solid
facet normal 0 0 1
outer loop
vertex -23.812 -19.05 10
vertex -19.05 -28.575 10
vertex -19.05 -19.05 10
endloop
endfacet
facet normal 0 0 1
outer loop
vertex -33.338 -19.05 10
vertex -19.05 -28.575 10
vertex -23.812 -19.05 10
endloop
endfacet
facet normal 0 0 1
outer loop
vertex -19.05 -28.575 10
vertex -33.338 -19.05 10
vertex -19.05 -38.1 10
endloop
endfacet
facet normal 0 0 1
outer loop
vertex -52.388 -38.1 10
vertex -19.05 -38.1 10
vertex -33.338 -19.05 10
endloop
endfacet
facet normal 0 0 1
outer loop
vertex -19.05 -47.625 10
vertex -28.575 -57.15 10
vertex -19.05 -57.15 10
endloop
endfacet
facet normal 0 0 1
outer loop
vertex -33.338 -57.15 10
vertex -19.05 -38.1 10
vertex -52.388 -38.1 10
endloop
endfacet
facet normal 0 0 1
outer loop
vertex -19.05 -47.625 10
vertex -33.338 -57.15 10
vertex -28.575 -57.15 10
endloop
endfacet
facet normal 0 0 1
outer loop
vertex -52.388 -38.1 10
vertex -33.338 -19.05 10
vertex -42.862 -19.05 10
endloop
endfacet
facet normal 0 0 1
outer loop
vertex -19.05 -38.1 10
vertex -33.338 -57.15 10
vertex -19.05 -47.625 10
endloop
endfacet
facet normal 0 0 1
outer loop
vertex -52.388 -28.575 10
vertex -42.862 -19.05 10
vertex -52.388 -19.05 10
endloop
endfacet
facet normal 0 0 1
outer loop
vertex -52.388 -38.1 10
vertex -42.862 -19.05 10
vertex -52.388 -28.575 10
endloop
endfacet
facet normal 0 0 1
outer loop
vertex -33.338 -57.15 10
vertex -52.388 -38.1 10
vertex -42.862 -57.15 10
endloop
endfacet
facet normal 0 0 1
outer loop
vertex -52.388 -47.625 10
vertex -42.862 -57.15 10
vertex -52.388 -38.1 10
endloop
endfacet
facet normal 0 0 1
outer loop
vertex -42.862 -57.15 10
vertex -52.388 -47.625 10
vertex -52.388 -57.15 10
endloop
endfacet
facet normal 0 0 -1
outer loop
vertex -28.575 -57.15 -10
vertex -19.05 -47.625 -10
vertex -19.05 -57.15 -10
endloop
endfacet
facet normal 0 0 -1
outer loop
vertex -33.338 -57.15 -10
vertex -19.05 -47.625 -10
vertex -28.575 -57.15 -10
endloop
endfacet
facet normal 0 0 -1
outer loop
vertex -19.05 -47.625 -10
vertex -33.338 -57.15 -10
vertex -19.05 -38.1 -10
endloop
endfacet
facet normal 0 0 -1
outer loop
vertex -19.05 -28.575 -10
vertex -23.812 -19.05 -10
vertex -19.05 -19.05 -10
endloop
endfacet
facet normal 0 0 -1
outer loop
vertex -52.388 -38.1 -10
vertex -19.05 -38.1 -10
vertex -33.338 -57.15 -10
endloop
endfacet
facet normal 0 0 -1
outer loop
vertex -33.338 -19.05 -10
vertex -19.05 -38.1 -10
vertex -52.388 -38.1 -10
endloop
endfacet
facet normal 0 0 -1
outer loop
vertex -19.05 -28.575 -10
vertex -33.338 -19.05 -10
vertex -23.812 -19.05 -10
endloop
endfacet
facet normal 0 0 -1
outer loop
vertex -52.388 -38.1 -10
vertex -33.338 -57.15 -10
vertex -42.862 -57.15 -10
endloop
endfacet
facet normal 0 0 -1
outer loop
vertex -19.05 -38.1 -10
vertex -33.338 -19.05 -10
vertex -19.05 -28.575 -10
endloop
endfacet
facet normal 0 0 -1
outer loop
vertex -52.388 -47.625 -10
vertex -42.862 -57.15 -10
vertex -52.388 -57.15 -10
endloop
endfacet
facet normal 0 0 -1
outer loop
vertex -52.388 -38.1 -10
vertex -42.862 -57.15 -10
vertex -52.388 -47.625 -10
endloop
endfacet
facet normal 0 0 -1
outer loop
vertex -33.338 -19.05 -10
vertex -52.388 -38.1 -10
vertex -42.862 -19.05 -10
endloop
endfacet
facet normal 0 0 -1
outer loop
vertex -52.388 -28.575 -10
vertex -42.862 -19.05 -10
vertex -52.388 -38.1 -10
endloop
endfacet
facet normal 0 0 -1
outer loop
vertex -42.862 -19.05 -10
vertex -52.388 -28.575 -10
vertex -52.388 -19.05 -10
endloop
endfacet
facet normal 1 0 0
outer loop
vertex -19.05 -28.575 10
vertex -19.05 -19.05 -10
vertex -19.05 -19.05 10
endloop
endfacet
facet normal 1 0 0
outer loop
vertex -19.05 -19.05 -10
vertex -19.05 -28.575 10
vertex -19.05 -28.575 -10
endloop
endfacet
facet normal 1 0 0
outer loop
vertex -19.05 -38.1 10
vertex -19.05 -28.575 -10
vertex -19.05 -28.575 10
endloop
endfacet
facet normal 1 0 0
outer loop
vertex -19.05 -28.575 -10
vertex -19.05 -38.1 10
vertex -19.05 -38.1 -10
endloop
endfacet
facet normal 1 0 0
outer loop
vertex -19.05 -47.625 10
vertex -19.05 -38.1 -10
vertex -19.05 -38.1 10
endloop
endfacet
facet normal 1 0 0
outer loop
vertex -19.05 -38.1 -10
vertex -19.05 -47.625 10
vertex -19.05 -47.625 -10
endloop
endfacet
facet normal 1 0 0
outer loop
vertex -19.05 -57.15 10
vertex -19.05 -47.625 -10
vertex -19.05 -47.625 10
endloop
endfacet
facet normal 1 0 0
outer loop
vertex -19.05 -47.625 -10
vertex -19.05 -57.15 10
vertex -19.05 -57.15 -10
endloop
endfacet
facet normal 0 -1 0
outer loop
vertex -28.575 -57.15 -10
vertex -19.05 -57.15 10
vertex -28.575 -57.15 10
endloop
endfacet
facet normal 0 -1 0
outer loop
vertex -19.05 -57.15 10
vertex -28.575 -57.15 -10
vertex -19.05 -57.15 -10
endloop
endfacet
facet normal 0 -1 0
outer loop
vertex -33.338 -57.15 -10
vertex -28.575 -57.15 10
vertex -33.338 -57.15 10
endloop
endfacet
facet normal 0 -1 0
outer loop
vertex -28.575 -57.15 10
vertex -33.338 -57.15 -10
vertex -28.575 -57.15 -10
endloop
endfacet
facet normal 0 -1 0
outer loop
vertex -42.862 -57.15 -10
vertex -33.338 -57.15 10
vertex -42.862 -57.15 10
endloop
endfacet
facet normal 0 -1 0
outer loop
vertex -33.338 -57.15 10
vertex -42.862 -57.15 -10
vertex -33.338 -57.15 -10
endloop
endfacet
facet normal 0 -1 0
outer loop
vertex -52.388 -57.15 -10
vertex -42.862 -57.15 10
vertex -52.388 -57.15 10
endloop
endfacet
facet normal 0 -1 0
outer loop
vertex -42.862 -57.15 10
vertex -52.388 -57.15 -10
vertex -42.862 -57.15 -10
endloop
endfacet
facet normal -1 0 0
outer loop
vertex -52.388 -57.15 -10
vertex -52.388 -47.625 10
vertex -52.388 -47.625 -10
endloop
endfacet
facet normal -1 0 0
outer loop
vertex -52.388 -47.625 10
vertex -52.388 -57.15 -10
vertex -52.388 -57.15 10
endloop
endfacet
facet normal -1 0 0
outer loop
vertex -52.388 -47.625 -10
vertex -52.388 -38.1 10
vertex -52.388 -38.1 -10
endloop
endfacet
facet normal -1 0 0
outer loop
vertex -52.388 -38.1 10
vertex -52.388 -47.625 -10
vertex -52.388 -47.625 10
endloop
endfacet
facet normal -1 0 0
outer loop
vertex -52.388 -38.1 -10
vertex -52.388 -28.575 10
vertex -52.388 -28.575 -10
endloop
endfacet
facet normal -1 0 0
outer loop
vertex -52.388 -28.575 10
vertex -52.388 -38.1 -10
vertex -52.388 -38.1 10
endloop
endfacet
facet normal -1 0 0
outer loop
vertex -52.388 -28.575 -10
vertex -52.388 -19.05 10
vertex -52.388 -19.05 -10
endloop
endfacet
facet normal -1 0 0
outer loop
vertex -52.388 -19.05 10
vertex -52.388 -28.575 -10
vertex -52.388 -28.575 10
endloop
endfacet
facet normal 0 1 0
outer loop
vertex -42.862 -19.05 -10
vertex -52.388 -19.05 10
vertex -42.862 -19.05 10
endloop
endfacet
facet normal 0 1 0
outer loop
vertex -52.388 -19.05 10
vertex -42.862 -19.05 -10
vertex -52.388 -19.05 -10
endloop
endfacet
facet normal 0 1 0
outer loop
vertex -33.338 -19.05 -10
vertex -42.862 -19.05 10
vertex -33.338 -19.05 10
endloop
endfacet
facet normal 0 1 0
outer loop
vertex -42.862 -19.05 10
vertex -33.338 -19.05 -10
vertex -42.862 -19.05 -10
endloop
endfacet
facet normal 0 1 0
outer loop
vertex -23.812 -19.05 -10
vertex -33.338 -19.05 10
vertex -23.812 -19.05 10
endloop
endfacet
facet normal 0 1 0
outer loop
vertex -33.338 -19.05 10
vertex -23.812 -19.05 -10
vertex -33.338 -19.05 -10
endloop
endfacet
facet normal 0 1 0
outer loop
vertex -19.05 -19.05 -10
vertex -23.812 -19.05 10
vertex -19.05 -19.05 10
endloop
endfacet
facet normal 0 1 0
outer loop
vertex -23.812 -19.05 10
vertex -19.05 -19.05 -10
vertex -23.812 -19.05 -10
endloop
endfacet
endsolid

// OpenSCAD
polyhedron(
    points=[
    [-19.05, -19.05, 10],
    [-19.05, -28.575, 10],
    [-19.05, -38.1, 10],
    [-19.05, -47.625, 10],
    [-19.05, -57.15, 10],
    [-28.575, -57.15, 10],
    [-33.3375, -57.15, 10],
    [-42.8625, -57.15, 10],
    [-52.3875, -57.15, 10],
    [-52.3875, -47.625, 10],
    [-52.3875, -38.1, 10],
    [-52.3875, -28.575, 10],
    [-52.3875, -19.05, 10],
    [-42.8625, -19.05, 10],
    [-33.3375, -19.05, 10],
    [-23.8125, -19.05, 10],
    [-19.05, -19.05, -10],
    [-19.05, -28.575, -10],
    [-19.05, -38.1, -10],
    [-19.05, -47.625, -10],
    [-19.05, -57.15, -10],
    [-28.575, -57.15, -10],
    [-33.3375, -57.15, -10],
    [-42.8625, -57.15, -10],
    [-52.3875, -57.15, -10],
    [-52.3875, -47.625, -10],
    [-52.3875, -38.1, -10],
    [-52.3875, -28.575, -10],
    [-52.3875, -19.05, -10],
    [-42.8625, -19.05, -10],
    [-33.3375, -19.05, -10],
    [-23.8125, -19.05, -10],
    ],
    faces=[
        [0,1,2,3,4,5,6,7,8,9,10,11,12,13,14,15],
        [31,30,29,28,27,26,25,24,23,22,21,20,19,18,17,16],
        [0,16,17,1],
        [1,17,18,2],
        [2,18,19,3],
        [3,19,20,4],
        [4,20,21,5],
        [5,21,22,6],
        [6,22,23,7],
        [7,23,24,8],
        [8,24,25,9],
        [9,25,26,10],
        [10,26,27,11],
        [11,27,28,12],
        [12,28,29,13],
        [13,29,30,14],
        [14,30,31,15],
        [15,31,16,0],
    ]
);
